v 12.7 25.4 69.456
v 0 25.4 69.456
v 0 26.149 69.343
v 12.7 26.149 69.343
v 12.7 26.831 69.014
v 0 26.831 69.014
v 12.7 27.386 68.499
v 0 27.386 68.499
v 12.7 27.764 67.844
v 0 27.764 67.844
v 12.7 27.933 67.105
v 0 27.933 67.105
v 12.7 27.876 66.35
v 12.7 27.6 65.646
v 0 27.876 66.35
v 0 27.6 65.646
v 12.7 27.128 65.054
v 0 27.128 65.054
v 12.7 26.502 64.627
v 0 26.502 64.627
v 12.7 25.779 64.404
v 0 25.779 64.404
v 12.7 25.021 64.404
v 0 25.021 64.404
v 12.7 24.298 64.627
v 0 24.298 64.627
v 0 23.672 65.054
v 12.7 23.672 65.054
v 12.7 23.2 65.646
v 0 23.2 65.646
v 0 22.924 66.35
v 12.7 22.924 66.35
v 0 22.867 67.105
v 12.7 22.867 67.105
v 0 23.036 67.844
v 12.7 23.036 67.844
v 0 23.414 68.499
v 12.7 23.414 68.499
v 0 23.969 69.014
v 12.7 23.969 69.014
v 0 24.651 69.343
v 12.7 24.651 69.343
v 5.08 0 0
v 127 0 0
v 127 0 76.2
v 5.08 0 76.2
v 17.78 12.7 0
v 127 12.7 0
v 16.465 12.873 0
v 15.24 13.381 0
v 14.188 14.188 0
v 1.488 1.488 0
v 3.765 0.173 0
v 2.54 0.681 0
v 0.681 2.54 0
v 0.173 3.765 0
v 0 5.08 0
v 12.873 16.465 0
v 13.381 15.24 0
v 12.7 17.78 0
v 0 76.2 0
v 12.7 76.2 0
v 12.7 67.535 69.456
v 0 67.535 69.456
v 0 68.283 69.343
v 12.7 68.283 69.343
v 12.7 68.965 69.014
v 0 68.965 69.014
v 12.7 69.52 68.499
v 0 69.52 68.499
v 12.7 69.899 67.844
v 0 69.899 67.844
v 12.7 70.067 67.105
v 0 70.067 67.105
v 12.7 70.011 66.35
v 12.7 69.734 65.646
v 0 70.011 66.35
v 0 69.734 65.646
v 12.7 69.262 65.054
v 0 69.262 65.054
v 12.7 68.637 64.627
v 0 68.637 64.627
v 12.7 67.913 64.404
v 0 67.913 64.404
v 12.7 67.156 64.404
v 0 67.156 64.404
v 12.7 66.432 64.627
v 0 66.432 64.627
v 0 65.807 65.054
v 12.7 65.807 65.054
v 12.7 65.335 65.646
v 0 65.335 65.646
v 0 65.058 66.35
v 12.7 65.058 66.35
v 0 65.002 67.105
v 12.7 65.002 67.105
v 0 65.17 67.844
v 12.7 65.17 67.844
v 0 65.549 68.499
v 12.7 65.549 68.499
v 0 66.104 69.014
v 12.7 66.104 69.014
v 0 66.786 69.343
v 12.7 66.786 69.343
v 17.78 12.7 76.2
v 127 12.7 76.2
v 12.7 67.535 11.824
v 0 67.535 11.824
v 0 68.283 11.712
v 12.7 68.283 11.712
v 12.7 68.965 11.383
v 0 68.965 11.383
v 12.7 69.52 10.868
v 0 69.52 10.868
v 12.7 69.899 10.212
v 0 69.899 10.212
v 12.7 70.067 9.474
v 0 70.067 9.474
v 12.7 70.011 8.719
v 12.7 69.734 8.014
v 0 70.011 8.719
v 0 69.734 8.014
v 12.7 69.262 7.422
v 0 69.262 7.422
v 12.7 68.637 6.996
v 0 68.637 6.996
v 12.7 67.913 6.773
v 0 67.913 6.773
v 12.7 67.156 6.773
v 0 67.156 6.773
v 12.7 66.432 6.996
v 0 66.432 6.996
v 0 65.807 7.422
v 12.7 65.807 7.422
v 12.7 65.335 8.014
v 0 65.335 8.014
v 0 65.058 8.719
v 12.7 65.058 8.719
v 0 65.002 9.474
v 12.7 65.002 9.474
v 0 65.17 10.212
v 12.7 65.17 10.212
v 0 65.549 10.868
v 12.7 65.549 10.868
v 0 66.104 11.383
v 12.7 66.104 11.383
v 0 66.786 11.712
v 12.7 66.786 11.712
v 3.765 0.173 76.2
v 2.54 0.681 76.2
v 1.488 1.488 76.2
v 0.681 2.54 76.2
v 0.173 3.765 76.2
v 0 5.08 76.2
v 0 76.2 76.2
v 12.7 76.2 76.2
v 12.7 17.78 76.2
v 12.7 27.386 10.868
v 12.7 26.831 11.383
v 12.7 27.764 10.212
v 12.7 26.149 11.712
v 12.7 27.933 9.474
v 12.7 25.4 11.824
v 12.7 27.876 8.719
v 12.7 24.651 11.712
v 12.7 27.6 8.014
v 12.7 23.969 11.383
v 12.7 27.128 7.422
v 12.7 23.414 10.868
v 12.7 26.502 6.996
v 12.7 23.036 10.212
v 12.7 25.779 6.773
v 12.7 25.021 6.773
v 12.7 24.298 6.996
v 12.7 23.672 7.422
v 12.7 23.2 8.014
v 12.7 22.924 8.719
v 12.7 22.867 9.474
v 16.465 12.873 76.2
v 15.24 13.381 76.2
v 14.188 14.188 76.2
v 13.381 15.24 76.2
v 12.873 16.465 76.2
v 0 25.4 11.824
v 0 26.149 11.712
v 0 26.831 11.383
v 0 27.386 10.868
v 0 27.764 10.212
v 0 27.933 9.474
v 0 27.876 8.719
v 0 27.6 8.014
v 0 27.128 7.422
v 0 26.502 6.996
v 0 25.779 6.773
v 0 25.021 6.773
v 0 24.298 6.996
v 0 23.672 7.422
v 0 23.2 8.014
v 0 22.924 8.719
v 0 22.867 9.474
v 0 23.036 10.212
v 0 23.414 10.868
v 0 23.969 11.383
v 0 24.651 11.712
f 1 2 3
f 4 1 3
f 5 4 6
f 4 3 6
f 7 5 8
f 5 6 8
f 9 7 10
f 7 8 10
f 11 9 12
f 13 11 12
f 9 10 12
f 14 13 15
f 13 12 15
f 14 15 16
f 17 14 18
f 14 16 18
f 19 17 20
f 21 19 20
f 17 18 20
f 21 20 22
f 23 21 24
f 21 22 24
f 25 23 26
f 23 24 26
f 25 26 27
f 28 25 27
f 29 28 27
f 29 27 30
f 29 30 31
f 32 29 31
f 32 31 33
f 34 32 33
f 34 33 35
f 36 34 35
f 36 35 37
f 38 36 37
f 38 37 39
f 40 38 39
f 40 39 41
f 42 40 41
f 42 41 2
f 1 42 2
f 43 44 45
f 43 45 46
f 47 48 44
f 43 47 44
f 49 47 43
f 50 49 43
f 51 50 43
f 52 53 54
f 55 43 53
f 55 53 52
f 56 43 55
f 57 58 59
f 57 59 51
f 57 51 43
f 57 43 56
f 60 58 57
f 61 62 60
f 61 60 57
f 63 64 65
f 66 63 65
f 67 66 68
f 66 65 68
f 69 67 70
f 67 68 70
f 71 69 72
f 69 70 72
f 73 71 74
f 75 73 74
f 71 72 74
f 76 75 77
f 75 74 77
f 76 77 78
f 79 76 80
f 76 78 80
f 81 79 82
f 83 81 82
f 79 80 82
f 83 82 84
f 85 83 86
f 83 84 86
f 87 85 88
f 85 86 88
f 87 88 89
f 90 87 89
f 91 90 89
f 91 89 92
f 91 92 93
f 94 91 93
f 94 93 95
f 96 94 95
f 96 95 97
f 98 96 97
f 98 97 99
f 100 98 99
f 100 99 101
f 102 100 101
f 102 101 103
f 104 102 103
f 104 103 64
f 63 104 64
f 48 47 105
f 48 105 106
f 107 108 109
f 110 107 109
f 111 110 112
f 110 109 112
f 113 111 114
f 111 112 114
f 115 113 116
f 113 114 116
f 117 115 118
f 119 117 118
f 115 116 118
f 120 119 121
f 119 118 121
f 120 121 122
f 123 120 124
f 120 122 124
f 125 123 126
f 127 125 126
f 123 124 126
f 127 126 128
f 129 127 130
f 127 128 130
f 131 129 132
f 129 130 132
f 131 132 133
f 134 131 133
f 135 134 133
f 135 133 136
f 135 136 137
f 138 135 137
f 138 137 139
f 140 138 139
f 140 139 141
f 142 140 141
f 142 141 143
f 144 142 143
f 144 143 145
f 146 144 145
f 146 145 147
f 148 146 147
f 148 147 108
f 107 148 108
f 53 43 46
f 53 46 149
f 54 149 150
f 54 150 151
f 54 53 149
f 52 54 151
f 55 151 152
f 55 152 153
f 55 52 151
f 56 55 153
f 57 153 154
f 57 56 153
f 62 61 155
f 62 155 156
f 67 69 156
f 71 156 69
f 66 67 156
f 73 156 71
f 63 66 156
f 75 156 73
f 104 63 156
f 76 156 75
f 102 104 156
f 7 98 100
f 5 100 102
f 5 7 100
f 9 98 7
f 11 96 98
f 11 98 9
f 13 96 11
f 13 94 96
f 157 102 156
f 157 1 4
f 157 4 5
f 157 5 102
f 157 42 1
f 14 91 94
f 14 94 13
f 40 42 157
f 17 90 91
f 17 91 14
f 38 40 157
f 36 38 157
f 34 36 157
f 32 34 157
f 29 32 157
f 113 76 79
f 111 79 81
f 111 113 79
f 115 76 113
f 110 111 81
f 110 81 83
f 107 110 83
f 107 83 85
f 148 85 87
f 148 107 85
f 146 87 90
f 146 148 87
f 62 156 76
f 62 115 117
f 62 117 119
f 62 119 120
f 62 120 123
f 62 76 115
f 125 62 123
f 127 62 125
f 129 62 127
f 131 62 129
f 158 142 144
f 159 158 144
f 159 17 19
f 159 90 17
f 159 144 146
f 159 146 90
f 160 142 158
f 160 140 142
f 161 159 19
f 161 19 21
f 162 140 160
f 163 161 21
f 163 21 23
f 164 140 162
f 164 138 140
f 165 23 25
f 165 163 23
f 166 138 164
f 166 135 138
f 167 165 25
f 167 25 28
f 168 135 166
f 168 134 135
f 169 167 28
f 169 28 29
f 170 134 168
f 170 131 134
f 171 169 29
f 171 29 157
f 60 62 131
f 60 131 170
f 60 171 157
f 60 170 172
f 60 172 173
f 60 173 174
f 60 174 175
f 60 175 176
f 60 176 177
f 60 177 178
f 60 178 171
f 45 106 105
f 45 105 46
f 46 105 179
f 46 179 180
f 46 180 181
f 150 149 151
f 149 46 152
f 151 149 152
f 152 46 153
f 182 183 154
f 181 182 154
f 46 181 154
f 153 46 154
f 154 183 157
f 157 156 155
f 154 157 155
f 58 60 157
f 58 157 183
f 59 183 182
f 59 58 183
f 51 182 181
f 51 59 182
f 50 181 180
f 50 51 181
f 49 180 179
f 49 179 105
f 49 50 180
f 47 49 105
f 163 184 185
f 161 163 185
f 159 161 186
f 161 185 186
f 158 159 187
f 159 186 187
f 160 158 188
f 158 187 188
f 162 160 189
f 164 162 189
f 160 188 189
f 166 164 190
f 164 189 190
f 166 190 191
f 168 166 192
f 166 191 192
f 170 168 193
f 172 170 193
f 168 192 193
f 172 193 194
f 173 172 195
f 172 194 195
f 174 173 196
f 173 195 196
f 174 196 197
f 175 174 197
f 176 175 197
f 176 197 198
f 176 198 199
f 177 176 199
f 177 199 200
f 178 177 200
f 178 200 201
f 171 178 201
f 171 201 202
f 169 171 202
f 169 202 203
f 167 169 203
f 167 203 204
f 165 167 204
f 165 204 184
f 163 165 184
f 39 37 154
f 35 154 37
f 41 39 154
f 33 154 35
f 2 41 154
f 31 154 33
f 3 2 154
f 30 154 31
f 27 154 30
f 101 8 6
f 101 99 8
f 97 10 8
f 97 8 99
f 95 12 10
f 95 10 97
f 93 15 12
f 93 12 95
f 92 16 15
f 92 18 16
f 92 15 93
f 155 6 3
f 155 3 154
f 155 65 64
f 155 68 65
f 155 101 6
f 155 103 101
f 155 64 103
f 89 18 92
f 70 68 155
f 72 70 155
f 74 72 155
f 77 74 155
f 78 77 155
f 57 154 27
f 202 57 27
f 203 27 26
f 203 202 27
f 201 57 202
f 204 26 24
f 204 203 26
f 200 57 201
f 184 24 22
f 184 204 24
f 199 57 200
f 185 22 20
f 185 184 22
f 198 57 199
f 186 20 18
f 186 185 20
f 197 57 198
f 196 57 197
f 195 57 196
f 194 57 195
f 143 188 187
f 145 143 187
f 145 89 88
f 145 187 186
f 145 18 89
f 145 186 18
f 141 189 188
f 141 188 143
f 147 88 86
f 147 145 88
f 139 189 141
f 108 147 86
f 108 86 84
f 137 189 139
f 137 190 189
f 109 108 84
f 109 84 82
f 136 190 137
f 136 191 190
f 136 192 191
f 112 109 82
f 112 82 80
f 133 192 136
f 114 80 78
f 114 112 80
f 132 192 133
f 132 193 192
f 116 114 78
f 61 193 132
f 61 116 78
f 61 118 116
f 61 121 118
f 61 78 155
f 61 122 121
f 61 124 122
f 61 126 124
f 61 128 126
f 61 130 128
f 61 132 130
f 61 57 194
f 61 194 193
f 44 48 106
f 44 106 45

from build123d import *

# Parameters (mm, degrees)
BOSS_EXTRUDE1_DEPTH = 76.2
SKETCH4_R           = 2.54
CUT_EXTRUDE2_DEPTH  = 76.2


with BuildPart() as part:
    # Sketch1 → Boss-Extrude1 (new body)
    with BuildSketch(Plane.XY):
        with BuildLine():
            Line((0, 5.08), (0, 76.2))
            Line((0, 76.2), (12.7, 76.2))
            Line((12.7, 76.2), (12.7, 17.78))
            ThreePointArc((12.7, 17.78), (14.187897552, 14.187897552), (17.78, 12.7))
            Line((17.78, 12.7), (127, 12.7))
            Line((127, 12.7), (127, 0))
            Line((127, 0), (5.08, 0))
            ThreePointArc((5.08, 0), (1.487897552, 1.487897552), (0, 5.08))
        make_face()
    extrude(amount=BOSS_EXTRUDE1_DEPTH)

    # Sketch4 → Cut-Extrude2 (cut)
    with BuildSketch(Plane.ZY):
        with Locations((9.284401907, 67.53455822)):
            Circle(SKETCH4_R)
        with Locations((66.915598093, 67.53455822)):
            Circle(SKETCH4_R)
        with Locations((66.915598093, 25.4)):
            Circle(SKETCH4_R)
        with Locations((9.284401907, 25.4)):
            Circle(SKETCH4_R)
    extrude(amount=-CUT_EXTRUDE2_DEPTH, mode=Mode.SUBTRACT)


solid = part.part
